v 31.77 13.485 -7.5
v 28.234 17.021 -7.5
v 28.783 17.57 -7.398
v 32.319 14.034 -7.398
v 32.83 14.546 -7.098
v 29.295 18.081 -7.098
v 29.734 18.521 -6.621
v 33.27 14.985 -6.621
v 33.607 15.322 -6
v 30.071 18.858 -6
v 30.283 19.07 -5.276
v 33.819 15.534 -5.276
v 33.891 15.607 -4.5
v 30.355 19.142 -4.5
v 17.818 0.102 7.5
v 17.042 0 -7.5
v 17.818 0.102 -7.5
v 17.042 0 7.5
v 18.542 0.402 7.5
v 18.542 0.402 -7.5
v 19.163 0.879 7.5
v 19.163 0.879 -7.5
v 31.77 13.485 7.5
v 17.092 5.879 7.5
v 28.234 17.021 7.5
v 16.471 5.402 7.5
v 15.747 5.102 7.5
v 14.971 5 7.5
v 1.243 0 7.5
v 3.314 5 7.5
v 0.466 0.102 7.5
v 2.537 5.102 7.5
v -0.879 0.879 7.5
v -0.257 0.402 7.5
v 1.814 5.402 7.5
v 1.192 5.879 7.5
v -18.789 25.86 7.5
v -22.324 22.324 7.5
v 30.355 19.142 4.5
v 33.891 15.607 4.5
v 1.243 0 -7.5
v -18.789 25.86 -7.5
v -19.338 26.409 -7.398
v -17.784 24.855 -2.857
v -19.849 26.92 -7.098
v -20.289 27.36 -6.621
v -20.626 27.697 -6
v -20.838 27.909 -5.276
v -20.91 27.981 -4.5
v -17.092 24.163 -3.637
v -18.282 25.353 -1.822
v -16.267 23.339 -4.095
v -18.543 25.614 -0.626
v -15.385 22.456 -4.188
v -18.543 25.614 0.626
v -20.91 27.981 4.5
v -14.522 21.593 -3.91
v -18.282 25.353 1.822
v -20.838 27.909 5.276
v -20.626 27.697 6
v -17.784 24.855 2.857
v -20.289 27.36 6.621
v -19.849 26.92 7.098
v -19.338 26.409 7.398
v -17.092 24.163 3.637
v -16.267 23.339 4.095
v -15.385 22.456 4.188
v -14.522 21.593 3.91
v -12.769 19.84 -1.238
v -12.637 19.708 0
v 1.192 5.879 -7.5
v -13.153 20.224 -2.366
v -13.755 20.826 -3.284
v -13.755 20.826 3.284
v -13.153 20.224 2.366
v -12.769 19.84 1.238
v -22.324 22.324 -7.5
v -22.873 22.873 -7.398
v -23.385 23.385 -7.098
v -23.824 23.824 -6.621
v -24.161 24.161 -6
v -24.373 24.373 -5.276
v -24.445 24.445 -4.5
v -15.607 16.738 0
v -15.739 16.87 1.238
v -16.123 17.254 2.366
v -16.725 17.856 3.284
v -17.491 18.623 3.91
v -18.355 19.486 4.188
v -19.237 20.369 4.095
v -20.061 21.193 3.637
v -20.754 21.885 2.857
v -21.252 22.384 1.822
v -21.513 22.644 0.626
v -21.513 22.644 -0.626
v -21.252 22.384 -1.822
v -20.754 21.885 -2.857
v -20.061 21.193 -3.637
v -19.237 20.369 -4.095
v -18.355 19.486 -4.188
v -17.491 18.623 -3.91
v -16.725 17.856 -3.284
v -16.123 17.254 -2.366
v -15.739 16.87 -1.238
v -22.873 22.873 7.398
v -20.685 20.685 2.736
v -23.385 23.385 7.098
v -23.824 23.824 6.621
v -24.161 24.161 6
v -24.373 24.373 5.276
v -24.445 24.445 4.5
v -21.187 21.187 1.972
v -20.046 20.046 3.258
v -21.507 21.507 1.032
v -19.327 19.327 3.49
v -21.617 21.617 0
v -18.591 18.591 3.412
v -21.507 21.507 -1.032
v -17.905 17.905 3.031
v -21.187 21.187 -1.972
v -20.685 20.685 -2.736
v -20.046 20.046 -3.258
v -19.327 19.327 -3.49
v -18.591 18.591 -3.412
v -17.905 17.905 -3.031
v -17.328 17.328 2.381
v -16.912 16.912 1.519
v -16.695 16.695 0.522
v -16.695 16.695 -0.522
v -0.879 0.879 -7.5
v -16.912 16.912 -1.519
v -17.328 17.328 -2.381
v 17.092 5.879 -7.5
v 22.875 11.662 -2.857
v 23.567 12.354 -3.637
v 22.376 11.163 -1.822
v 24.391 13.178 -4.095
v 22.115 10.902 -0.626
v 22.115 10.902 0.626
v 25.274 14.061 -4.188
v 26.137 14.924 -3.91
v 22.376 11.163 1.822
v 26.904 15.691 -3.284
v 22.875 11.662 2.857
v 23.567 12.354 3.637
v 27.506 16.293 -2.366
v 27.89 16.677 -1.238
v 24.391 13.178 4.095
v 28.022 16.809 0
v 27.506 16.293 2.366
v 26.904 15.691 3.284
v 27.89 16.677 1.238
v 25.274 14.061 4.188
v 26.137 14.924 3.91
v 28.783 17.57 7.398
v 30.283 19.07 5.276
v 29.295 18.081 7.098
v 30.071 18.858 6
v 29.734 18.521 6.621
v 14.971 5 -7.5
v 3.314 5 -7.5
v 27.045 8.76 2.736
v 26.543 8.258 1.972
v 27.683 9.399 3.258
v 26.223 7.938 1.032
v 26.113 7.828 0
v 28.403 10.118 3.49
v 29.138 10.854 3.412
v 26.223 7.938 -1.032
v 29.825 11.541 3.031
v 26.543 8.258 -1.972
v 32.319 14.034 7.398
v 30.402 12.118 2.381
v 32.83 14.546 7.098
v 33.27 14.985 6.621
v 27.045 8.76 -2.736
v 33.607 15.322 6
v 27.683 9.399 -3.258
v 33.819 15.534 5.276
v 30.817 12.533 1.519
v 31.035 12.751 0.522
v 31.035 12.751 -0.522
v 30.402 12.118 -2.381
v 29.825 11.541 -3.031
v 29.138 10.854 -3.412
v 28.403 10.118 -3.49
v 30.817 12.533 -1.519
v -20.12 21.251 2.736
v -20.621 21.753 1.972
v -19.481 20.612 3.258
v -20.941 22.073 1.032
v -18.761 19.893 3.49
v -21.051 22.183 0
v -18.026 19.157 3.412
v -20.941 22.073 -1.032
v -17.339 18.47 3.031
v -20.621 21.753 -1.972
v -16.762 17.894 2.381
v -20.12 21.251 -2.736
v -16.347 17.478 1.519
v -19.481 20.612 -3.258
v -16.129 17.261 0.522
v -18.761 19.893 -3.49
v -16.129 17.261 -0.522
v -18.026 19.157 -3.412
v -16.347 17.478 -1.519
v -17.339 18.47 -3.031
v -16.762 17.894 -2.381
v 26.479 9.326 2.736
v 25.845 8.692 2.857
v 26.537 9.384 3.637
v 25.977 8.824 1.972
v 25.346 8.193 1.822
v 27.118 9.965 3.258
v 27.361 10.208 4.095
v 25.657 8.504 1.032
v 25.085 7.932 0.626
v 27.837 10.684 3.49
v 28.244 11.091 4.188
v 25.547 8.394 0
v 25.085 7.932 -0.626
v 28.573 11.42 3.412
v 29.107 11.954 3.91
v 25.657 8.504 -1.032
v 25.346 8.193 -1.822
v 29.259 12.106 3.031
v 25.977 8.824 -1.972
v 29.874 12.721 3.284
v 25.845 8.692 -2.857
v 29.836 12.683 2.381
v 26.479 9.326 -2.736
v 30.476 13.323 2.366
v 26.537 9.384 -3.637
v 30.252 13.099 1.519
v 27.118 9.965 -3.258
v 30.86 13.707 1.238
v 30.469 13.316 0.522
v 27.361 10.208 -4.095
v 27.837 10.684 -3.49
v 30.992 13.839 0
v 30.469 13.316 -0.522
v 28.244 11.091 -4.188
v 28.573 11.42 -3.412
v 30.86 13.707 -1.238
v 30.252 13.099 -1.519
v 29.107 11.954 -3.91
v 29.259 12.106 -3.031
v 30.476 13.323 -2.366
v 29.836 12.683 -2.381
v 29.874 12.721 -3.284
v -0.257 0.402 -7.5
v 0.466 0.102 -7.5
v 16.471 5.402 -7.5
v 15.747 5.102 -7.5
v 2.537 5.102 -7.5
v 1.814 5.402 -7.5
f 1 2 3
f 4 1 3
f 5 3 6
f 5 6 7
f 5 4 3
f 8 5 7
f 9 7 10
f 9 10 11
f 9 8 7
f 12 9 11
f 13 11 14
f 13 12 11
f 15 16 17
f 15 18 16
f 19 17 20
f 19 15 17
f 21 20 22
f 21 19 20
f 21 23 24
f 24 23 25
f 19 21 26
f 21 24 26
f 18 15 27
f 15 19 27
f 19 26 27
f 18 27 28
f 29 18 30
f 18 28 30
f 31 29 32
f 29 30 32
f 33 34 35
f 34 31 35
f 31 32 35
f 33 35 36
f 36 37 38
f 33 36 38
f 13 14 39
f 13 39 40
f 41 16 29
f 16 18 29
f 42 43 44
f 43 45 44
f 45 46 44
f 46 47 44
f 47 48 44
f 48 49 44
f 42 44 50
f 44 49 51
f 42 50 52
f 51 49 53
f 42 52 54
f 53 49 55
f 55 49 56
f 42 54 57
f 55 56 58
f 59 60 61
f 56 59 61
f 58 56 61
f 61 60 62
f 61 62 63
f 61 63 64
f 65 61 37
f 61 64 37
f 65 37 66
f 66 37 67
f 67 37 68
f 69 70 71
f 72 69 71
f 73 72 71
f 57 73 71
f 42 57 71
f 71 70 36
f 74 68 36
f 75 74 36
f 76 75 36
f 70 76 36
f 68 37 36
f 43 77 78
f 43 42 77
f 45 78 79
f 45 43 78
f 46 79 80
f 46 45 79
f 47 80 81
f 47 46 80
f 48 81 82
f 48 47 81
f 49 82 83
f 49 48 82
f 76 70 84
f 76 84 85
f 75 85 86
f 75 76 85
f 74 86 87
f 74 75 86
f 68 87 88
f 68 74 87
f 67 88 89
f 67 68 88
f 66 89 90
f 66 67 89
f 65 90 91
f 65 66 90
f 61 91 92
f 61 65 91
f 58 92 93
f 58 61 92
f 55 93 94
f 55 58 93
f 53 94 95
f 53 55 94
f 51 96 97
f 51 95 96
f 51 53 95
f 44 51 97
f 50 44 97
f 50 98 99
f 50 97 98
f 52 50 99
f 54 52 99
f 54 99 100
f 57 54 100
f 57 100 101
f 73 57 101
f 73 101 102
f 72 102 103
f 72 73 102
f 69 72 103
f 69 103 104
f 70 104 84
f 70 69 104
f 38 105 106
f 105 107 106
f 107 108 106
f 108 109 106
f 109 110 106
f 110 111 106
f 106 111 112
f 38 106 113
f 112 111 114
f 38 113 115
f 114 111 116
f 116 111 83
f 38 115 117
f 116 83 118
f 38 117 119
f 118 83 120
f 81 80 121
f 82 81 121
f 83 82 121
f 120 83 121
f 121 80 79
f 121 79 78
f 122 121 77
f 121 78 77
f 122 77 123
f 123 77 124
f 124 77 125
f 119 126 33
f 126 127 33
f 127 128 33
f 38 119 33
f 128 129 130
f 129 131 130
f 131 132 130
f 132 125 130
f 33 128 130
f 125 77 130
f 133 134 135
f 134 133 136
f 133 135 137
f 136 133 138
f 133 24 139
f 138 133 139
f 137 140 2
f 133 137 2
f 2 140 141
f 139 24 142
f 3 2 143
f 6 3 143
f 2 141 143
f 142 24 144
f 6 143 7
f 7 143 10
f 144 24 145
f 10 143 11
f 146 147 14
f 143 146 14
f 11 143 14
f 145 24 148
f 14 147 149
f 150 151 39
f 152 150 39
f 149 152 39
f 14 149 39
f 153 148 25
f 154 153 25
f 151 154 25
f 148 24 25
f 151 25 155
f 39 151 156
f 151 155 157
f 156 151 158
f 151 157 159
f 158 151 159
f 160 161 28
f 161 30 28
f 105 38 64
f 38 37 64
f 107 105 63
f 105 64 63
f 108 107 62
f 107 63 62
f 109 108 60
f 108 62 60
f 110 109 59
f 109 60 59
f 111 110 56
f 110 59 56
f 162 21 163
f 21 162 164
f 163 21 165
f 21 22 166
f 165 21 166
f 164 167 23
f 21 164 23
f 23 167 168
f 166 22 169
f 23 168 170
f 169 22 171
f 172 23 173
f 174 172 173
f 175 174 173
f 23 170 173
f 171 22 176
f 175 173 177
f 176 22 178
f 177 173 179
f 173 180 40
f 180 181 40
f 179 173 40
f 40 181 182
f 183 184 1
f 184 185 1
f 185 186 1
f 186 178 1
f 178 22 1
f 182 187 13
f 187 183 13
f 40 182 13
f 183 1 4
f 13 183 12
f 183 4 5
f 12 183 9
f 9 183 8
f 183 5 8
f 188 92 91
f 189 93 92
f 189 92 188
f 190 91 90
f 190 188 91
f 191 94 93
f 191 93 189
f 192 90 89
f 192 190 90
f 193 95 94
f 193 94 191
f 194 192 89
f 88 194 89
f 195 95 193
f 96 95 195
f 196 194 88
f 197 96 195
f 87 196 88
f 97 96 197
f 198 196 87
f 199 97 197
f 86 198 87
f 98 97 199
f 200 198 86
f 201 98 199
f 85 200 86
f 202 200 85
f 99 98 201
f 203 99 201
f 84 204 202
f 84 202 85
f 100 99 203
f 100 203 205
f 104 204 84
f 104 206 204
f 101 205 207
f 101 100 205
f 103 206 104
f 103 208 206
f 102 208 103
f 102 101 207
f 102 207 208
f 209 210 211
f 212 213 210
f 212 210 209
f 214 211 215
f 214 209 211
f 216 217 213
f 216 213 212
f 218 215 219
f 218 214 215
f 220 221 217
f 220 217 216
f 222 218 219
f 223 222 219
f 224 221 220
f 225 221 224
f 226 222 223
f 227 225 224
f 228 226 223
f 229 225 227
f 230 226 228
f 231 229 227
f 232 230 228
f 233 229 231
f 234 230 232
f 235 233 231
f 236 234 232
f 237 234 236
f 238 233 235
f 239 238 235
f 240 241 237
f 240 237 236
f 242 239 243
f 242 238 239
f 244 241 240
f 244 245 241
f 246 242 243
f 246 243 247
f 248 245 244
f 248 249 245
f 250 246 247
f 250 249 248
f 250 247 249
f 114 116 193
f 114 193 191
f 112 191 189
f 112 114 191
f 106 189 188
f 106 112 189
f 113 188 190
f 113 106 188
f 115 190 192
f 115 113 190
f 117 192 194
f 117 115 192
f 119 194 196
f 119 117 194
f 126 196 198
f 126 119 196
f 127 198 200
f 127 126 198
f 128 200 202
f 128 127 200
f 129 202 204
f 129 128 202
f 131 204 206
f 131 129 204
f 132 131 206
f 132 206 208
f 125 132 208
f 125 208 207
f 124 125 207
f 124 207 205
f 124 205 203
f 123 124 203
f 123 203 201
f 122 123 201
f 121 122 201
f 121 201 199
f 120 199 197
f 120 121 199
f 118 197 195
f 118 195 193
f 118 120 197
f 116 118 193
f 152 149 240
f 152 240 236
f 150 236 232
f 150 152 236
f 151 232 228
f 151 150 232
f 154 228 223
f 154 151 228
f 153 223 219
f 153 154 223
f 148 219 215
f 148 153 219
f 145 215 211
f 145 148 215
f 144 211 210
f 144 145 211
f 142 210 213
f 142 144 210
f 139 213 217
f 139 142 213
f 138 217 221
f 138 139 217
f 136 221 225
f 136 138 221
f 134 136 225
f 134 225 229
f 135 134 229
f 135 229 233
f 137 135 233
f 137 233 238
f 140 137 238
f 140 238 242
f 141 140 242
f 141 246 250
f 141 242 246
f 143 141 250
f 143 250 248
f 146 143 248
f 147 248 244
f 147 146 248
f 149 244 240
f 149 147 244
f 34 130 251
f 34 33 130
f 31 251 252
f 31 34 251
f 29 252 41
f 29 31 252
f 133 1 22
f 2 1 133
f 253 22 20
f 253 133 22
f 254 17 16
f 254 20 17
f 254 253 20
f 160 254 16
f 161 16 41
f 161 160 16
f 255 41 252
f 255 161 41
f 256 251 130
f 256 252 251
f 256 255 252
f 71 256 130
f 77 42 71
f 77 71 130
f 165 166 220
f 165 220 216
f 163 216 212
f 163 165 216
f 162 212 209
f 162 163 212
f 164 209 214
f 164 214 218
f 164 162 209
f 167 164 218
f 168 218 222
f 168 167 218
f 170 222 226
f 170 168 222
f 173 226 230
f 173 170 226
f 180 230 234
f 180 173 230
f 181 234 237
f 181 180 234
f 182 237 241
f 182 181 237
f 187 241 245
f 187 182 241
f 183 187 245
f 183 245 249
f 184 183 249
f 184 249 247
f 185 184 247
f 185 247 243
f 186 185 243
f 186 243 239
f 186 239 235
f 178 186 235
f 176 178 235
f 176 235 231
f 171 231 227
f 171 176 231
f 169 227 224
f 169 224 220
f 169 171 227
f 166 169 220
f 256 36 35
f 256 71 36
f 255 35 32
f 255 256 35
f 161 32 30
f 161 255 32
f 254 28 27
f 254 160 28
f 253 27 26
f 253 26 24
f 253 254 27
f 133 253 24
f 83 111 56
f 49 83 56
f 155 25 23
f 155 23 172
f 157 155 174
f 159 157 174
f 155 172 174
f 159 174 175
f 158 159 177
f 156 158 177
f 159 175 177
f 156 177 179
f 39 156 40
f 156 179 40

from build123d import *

# Parameters (mm, degrees)
EXTRUDE_1_DEPTH          = 7.5
CUT_EXTRUDE_1_DEPTH      = 45.584481316
CUT_EXTRUDE_1_DEPTH_BACK = 45.584481316
SKETCH_2_R               = 4.2
CUT_EXTRUDE_2_DEPTH      = 51.621141828
CUT_EXTRUDE_2_DEPTH_BACK = 51.621141828
SKETCH_3_R               = 4.2
FILLET_1_R               = 3
SKETCH_4_R               = 4.2
SKETCH_4_R_2             = 3.5
EXTRUDE_2_DEPTH          = 0.8
SKETCH_5_R               = 4.2
SKETCH_5_R_2             = 3.5
EXTRUDE_3_DEPTH          = 0.8


with BuildPart() as part:
    # ｽｹｯﾁ1 → ﾎﾞｽ - 押し出し1 (new, symmetric)
    with BuildSketch(Plane.XY):
        Polygon((0, 0), (-24.445436483, 24.445436483), (-20.909902577, 27.980970389), (2.071067812, 5), (16.213203436, 5), (30.355339059, 19.142135624), (33.890872965, 15.606601718), (18.284271247, 0), align=None)
    extrude(amount=EXTRUDE_1_DEPTH, both=True)

    # ｽｹｯﾁ2 → ｶｯﾄ - 押し出し1 (cut, two sides: drawn at the far end of the back side and taken through both)
    with BuildSketch(Plane(origin=(0, 0, 0), x_dir=(0, 0, 1), z_dir=(-0.7071067811865487, -0.7071067811865464, 0)).offset(-CUT_EXTRUDE_1_DEPTH_BACK)):
        with Locations(Location((0, 27.071067812, 0), (0, 0, 270))):
            Circle(SKETCH_2_R)
    extrude(amount=CUT_EXTRUDE_1_DEPTH + CUT_EXTRUDE_1_DEPTH_BACK, mode=Mode.SUBTRACT)

    # ｽｹｯﾁ3 → ｶｯﾄ - 押し出し2 (cut, two sides: drawn at the far end of the back side and taken through both)
    with BuildSketch(Plane(origin=(9.142135624, -9.142135624, 0), x_dir=(0, 0, -1), z_dir=(0.707106781186549, -0.7071067811865461, 0)).offset(-CUT_EXTRUDE_2_DEPTH_BACK)):
        with Locations(Location((0, 27.5, 0), (0, 0, 90))):
            Circle(SKETCH_3_R)
    extrude(amount=CUT_EXTRUDE_2_DEPTH + CUT_EXTRUDE_2_DEPTH_BACK, mode=Mode.SUBTRACT)

    # ﾌｨﾚｯﾄ1
    fillet_1_edges = [part.edges().sort_by_distance(p)[0] for p in [
        (32.123106012, 17.374368671, -7.5),
        (32.123106012, 17.374368671, 7.5),
        (0, 0, 0),
        (2.071067812, 5, 0),
        (16.213203436, 5, 0),
        (18.284271247, 0, 0),
        (-22.67766953, 26.213203436, 7.5),
        (-22.67766953, 26.213203436, -7.5),
    ]]
    fillet(fillet_1_edges, radius=FILLET_1_R)

    # ｽｹｯﾁ4 → ﾎﾞｽ - 押し出し2 (add)
    with BuildSketch(Plane(origin=(0, 0, 0), x_dir=(0, 0, -1), z_dir=(0.7071067811865475, 0.7071067811865476, 0))):
        with Locations(Location((0, 27.071067812, 0), (0, 0, 270))):
            Circle(SKETCH_4_R)
        with Locations(Location((0, 27.071067812, 0), (0, 0, 90))):
            Circle(SKETCH_4_R_2, mode=Mode.SUBTRACT)
    extrude(amount=EXTRUDE_2_DEPTH)

    # ｽｹｯﾁ5 → ﾎﾞｽ - 押し出し3 (add)
    with BuildSketch(Plane(origin=(9.142135624, -9.142135624, 0), x_dir=(0, 0, 1), z_dir=(-0.7071067811865485, 0.7071067811865467, 0))):
        with Locations(Location((0, 27.5, 0), (0, 0, 90))):
            Circle(SKETCH_5_R)
        with Locations(Location((0, 27.5, 0), (0, 0, 270))):
            Circle(SKETCH_5_R_2, mode=Mode.SUBTRACT)
    extrude(amount=EXTRUDE_3_DEPTH)


solid = part.part
